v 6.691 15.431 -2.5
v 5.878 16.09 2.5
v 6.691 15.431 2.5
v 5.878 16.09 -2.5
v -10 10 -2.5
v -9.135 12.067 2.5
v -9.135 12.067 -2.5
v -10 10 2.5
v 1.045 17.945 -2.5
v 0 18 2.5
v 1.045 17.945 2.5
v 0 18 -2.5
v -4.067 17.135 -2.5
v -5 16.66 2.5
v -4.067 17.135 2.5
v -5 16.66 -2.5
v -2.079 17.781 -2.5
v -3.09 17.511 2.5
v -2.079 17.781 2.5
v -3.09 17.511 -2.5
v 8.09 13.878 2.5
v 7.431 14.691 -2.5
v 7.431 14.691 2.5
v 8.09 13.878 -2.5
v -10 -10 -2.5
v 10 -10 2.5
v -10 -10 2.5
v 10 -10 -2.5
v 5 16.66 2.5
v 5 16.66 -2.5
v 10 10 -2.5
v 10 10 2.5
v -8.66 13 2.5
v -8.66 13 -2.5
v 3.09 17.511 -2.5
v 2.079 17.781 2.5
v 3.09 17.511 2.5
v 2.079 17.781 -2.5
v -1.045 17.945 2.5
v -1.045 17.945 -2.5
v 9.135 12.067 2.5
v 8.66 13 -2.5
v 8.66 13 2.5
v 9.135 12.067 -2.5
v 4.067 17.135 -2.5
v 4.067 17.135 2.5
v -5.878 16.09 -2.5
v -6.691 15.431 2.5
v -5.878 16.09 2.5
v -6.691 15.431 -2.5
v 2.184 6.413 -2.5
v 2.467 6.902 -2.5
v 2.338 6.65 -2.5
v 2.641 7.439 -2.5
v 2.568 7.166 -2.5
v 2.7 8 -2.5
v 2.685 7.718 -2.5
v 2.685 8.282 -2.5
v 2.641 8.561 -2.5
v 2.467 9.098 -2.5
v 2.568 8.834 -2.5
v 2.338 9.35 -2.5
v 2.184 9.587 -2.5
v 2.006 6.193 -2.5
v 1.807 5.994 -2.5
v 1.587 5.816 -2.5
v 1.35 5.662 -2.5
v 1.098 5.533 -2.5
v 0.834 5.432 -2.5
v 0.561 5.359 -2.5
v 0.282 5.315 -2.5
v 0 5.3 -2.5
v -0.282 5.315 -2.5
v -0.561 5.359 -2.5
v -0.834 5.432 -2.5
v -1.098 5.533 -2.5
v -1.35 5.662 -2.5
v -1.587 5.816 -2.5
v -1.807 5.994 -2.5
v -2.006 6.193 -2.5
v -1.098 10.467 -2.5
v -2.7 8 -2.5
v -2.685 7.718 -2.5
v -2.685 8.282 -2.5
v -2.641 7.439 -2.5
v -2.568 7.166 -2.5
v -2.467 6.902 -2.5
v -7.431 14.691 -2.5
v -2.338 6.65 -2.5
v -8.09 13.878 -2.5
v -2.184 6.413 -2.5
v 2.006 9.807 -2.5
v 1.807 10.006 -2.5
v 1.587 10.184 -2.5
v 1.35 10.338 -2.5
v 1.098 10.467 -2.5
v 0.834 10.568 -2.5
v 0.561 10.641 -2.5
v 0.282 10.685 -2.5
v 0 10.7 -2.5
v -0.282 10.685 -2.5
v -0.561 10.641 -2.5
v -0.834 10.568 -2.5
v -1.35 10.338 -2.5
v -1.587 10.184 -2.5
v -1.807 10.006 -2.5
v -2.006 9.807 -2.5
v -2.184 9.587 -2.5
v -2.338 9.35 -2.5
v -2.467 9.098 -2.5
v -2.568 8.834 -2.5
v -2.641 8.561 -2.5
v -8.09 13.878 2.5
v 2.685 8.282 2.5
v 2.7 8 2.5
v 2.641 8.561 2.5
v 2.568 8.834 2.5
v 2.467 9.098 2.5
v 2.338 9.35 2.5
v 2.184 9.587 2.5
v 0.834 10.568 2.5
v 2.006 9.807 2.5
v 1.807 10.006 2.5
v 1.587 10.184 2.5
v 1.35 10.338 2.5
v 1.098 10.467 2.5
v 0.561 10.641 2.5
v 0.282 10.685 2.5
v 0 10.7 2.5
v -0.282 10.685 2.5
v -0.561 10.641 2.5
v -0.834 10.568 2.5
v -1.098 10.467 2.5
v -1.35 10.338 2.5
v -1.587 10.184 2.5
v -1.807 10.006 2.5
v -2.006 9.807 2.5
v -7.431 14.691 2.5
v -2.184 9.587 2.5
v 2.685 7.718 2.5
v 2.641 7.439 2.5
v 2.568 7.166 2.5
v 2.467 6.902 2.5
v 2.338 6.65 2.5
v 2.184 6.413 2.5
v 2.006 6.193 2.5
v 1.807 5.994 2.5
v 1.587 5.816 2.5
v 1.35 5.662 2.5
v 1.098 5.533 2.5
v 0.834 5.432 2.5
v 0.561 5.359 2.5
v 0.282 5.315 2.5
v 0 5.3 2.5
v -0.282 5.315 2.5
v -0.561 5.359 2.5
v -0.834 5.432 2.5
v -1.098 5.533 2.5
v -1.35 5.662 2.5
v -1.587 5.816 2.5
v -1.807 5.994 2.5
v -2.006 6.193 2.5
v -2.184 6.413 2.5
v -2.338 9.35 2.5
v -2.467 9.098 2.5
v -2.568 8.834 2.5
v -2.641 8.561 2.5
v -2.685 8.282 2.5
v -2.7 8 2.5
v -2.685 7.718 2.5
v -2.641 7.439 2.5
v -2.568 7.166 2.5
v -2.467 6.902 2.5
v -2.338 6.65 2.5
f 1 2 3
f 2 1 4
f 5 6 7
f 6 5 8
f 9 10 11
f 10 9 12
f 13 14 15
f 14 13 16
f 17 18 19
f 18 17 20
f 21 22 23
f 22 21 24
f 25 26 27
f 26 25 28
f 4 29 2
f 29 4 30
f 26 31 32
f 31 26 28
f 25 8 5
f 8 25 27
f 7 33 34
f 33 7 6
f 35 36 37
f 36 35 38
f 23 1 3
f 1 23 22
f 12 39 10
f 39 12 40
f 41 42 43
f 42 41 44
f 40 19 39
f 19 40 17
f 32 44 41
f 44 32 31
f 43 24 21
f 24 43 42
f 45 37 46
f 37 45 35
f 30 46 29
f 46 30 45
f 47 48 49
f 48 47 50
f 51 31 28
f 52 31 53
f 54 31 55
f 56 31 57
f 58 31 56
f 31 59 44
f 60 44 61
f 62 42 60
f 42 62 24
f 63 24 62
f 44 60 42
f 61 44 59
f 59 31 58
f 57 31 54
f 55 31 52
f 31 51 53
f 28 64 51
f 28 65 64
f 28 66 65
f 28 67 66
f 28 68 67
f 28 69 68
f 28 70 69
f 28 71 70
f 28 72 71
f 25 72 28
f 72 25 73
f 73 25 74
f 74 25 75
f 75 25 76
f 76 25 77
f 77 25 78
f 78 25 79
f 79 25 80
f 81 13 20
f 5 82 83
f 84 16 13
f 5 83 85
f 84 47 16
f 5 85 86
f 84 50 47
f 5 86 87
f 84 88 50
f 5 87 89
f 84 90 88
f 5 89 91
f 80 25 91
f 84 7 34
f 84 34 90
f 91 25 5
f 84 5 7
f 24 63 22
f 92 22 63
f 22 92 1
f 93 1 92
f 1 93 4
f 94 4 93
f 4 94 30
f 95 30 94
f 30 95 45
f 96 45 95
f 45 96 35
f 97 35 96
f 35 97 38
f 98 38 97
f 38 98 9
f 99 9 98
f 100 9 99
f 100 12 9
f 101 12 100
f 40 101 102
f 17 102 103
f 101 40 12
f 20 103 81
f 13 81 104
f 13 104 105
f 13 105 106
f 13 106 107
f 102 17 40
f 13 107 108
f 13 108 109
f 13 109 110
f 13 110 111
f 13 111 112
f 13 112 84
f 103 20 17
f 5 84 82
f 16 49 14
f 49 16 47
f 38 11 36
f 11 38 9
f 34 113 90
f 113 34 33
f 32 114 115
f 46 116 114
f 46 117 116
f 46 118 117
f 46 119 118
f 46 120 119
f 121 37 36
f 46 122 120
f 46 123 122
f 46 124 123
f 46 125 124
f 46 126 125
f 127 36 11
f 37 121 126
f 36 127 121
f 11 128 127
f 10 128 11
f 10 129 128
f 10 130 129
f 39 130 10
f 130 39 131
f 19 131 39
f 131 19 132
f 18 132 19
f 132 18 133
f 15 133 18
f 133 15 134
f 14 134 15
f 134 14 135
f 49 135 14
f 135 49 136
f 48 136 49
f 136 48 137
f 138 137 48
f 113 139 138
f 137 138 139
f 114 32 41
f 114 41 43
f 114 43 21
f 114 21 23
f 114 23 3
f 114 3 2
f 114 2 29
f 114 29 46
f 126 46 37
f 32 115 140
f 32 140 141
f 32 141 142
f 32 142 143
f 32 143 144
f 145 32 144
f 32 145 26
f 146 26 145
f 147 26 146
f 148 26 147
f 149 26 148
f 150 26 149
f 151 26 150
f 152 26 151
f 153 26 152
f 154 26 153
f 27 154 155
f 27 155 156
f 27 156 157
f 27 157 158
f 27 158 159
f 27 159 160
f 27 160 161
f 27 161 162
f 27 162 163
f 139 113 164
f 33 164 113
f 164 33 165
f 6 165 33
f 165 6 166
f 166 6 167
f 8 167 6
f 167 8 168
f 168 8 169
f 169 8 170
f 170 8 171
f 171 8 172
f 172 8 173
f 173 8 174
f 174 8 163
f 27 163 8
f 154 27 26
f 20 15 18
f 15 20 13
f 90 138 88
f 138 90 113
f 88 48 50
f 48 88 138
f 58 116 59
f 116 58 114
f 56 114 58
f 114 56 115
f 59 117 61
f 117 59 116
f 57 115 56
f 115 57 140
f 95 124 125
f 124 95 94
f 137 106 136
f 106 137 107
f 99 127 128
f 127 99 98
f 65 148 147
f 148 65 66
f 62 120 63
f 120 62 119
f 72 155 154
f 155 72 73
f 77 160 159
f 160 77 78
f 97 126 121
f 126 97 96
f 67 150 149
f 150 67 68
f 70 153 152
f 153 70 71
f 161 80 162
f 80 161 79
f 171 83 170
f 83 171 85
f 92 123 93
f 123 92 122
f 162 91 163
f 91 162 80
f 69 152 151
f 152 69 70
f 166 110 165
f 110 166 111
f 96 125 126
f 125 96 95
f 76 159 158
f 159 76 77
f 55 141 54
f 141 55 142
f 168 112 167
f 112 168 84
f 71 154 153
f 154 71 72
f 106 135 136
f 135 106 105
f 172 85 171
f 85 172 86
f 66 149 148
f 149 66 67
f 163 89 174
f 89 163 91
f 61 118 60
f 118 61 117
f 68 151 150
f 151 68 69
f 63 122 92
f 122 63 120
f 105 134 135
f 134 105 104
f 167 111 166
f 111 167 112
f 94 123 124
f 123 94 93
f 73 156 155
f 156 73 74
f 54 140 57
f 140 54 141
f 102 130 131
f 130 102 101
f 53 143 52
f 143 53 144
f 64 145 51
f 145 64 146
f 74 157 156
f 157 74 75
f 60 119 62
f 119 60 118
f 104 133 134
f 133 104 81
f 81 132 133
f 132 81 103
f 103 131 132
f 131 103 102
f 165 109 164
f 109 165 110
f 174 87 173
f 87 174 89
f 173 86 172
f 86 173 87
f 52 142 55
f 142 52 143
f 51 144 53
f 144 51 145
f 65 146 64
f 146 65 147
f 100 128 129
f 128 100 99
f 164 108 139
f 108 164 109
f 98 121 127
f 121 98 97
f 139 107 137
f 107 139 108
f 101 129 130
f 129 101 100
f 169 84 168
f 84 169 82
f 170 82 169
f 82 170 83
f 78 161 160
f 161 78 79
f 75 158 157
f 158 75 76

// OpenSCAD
// Single-hole mounting tab.
$fn = 60;
eps = 0.02;
tab_w = 20;
tab_h = 36;
tab_t = 5;
hole_d = 5.4;
difference() {
    hull() {
        translate([0, 0, 0]) cube([tab_w, tab_w, tab_t], center = true);
        translate([0, tab_h / 2 - tab_w / 2, 0]) cylinder(d = tab_w, h = tab_t, center = true);
    }
    translate([0, tab_h / 2 - tab_w / 2, -tab_t / 2 - eps]) cylinder(d = hole_d, h = tab_t + 2 * eps);
}
